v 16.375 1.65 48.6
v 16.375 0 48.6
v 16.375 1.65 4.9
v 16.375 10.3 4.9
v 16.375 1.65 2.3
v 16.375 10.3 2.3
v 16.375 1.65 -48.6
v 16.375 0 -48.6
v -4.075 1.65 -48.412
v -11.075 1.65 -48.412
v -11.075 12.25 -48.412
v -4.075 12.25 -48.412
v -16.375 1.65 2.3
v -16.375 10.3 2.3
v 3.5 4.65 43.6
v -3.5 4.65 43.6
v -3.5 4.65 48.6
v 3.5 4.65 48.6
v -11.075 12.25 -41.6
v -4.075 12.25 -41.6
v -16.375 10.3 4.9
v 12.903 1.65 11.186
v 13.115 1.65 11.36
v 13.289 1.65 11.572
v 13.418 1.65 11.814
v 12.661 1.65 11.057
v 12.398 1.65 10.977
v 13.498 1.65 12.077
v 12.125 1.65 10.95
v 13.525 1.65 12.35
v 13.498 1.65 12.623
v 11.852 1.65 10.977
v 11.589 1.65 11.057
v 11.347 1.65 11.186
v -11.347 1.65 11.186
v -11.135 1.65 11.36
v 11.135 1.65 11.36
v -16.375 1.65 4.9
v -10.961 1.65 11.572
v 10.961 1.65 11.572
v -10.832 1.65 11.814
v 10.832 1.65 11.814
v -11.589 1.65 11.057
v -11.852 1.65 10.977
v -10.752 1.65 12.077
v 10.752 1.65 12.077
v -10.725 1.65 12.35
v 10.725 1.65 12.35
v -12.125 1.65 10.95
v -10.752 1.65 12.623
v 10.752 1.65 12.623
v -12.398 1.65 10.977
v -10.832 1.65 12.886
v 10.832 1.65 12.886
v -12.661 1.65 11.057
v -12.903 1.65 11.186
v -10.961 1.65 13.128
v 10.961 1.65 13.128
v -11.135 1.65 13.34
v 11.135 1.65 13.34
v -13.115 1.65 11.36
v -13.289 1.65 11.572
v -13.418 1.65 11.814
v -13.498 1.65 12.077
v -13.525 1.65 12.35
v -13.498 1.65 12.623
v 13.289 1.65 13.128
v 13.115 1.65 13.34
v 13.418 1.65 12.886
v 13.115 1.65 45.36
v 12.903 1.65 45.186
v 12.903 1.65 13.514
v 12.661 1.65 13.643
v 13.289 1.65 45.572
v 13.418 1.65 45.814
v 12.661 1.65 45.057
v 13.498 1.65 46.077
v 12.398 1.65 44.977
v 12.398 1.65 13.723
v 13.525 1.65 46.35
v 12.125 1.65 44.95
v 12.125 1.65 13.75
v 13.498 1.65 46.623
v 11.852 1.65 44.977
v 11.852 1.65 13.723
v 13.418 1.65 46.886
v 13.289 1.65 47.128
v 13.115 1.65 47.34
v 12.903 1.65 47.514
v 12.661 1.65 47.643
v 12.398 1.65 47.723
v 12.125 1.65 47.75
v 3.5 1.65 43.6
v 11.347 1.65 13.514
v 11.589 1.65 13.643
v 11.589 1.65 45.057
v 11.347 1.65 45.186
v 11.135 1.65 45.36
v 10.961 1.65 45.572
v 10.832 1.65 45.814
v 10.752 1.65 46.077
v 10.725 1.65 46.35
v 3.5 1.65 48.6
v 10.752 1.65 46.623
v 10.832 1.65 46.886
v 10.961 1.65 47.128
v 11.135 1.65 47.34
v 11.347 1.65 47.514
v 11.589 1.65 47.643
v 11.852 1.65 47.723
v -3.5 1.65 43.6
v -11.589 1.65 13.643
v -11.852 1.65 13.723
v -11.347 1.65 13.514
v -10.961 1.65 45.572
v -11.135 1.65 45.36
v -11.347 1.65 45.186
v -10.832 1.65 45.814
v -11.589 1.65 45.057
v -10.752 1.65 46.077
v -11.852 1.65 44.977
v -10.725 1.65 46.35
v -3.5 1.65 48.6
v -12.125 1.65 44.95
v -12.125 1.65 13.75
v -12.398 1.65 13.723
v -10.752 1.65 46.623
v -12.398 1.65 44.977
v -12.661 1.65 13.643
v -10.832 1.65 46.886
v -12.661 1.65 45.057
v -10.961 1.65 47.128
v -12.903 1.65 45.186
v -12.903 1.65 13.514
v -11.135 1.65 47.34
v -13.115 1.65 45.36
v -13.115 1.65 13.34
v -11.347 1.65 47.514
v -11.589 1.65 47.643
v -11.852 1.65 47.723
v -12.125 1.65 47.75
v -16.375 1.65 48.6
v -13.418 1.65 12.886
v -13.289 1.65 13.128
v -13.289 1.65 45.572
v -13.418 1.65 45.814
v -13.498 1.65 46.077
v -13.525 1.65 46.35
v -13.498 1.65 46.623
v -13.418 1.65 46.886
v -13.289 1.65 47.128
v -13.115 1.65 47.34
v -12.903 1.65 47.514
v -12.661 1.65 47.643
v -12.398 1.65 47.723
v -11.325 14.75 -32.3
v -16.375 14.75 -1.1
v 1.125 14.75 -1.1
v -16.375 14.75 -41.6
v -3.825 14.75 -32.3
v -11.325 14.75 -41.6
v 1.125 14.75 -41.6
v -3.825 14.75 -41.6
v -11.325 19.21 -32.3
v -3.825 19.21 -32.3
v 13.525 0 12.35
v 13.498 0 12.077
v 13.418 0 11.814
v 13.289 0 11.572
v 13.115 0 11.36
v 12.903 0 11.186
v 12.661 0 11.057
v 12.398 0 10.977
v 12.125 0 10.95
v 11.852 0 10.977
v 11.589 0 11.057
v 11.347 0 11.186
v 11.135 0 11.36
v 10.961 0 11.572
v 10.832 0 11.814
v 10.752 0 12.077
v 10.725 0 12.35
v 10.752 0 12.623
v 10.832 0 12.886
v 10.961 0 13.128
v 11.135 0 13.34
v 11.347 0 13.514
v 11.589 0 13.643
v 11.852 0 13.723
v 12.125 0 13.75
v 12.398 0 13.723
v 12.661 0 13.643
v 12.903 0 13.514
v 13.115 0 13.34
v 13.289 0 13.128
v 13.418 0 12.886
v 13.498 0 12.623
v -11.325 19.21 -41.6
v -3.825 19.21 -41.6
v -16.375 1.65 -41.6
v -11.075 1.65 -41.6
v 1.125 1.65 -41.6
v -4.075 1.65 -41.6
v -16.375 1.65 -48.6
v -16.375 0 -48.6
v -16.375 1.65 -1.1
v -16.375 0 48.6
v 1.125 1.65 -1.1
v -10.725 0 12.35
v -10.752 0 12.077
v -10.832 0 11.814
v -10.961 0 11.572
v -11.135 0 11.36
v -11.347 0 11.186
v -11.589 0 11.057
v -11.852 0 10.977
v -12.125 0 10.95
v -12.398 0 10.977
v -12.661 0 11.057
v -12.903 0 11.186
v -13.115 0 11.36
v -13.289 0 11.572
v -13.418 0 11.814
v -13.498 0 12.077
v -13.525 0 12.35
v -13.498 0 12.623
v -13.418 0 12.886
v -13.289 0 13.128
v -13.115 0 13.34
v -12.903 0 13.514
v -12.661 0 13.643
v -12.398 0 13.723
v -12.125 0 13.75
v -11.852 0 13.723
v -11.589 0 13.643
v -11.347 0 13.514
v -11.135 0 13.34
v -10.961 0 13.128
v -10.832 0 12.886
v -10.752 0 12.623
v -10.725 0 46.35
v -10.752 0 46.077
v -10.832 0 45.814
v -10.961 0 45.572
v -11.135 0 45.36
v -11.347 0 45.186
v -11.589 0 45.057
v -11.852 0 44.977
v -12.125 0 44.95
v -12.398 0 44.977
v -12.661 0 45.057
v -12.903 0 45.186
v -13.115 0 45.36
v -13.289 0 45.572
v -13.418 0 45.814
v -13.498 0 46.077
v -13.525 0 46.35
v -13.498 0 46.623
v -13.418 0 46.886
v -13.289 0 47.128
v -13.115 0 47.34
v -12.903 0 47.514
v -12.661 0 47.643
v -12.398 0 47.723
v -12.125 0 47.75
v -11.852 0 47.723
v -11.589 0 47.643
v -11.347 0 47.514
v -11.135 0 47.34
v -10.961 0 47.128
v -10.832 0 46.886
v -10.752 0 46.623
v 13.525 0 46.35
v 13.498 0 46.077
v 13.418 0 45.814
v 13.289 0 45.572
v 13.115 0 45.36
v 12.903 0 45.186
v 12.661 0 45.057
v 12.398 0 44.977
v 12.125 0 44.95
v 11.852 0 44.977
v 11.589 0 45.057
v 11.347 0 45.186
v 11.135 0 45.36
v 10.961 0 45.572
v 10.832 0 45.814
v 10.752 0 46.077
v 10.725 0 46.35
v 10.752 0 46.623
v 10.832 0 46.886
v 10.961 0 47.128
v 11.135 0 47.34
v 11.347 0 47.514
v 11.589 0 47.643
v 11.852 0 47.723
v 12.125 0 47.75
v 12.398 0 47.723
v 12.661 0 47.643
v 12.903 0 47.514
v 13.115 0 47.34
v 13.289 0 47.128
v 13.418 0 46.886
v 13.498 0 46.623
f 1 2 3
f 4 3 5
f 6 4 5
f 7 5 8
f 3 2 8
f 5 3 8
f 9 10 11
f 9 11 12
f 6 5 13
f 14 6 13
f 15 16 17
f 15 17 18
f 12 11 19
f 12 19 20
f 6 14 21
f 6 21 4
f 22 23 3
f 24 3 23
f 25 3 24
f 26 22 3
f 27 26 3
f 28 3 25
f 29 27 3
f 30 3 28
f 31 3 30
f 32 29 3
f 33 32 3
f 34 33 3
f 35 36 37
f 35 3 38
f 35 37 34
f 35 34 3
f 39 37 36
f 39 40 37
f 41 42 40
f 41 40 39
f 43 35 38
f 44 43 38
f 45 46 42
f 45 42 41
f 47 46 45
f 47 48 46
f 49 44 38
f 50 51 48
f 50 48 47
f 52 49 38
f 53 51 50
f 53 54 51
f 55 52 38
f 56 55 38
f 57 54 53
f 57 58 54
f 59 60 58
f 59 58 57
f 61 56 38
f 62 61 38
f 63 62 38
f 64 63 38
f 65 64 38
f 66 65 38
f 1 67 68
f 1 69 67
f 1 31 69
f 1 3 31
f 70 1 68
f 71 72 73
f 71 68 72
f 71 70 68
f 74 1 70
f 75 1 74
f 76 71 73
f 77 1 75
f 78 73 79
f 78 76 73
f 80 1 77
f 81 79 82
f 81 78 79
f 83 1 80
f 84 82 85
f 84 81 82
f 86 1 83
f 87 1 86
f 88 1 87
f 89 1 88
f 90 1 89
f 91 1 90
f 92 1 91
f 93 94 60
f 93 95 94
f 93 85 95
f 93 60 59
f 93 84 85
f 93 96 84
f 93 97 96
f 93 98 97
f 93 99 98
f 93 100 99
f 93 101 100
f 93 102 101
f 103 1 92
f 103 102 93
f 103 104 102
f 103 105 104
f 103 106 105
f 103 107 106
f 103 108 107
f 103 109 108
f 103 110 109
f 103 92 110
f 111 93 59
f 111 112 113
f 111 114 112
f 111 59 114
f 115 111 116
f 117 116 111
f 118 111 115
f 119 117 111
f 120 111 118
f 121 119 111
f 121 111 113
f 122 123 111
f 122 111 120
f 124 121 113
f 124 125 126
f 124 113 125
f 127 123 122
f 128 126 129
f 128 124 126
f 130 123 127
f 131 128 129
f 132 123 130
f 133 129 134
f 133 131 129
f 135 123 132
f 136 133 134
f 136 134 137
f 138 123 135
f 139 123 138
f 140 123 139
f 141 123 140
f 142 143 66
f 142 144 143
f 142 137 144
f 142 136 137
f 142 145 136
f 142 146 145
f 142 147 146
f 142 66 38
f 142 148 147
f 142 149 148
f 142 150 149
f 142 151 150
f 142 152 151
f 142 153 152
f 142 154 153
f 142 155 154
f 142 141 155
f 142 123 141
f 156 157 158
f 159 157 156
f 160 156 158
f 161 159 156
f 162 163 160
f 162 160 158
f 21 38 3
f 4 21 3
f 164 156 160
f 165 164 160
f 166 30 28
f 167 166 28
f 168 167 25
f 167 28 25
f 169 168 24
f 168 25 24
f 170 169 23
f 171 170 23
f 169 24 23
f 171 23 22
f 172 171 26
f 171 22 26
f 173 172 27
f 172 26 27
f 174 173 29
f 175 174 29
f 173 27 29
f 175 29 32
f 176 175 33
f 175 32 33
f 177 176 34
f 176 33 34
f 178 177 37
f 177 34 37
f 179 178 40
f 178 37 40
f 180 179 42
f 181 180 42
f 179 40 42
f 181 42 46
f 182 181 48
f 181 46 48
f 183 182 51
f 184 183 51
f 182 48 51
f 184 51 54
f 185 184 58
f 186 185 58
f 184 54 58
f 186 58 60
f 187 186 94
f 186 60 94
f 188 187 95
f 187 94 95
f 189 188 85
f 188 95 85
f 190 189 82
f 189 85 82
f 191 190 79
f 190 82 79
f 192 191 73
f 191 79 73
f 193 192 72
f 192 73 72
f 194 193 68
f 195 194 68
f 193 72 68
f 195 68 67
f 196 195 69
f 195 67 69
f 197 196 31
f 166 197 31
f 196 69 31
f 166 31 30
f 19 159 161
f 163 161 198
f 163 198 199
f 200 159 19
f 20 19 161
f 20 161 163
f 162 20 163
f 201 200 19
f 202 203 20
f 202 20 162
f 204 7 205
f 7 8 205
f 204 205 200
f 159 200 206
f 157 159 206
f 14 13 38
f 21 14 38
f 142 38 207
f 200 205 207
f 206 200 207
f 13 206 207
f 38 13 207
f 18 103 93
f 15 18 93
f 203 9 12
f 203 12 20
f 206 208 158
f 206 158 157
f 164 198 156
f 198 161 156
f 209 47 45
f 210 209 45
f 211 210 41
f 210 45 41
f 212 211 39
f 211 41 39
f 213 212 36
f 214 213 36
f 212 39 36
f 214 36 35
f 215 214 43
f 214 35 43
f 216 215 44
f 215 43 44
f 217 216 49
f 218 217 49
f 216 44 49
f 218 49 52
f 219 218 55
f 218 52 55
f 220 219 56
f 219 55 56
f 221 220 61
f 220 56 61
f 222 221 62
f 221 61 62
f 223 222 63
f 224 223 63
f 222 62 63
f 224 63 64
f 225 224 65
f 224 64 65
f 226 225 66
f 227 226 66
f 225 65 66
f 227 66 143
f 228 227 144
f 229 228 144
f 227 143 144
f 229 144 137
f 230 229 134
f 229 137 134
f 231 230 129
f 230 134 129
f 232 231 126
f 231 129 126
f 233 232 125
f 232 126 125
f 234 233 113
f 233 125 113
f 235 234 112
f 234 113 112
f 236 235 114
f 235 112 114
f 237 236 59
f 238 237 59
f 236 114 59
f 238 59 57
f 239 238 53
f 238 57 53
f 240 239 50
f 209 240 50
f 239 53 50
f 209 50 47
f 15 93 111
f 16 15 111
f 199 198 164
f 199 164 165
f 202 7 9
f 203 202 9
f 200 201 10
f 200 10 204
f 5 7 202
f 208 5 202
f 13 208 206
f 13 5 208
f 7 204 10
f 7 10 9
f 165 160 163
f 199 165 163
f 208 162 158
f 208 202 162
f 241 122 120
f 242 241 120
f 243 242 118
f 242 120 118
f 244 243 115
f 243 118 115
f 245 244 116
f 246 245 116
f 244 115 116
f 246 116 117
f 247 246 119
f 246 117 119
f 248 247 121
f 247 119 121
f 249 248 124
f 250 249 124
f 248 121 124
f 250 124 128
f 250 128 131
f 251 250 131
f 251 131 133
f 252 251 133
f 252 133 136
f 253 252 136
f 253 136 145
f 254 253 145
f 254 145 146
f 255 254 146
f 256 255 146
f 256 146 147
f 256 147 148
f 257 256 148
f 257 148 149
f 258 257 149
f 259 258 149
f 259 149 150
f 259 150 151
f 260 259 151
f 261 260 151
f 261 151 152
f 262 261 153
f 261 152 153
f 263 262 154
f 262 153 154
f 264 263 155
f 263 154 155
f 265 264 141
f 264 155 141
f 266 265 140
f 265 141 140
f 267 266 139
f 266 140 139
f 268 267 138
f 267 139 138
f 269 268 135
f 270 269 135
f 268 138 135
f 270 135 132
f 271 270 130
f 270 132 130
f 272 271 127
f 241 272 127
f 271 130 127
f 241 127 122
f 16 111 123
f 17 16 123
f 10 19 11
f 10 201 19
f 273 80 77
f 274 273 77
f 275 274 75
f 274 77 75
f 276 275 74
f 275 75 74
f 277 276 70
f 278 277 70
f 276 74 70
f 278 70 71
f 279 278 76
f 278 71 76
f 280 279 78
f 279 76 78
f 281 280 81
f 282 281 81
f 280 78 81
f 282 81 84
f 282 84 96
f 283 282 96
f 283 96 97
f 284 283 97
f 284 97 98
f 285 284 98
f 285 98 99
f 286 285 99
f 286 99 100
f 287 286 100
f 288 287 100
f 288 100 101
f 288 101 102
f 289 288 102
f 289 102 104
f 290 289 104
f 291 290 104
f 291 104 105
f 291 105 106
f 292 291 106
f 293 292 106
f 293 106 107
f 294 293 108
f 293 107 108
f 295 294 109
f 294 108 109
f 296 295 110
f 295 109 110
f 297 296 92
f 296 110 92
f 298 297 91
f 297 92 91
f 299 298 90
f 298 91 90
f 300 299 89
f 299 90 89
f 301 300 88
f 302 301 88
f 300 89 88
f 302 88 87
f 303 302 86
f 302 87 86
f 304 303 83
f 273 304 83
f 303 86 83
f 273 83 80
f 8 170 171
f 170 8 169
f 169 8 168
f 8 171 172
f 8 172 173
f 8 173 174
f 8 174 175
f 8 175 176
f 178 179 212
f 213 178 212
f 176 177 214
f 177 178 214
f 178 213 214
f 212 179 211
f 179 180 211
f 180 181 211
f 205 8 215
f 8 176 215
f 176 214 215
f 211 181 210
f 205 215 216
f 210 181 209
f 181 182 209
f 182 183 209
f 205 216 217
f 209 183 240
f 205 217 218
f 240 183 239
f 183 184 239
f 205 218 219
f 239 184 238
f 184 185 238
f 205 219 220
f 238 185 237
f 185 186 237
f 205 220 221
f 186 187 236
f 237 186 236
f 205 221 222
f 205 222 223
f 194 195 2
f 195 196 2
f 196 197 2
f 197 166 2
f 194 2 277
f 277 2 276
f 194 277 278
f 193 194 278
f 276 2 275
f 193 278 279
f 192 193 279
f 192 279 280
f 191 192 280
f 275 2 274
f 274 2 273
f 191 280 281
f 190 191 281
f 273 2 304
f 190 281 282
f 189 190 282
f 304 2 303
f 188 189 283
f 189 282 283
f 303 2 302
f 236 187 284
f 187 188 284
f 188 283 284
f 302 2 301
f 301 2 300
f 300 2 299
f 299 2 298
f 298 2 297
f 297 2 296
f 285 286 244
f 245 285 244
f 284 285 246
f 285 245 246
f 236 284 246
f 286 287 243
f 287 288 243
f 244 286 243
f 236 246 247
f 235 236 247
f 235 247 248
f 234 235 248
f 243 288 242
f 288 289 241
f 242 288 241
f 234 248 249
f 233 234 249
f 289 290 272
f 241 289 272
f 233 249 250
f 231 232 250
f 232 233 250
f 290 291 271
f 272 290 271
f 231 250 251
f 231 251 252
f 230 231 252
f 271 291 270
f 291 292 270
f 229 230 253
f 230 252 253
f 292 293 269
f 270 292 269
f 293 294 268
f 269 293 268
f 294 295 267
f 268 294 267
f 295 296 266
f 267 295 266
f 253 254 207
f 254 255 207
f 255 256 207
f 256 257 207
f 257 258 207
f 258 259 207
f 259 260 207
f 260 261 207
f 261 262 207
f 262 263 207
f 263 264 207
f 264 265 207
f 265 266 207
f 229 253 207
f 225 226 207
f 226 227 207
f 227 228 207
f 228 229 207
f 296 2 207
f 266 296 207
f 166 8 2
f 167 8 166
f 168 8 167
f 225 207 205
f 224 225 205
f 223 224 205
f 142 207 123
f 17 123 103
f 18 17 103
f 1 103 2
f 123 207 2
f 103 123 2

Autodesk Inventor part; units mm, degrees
ref_plane "YZ Plane" through (0, 0, 0) normal (1, 0, 0) x (0, 1, 0)
ref_plane "XZ Plane" through (0, 0, 0) normal (0, 1, 0) x (-1, 0, 0)
ref_plane "XY Plane" through (0, 0, 0) normal (0, 0, 1) x (1, 0, 0)
sketch "Sketch1" plane through (0, 0, 0) normal (0, 1, 0) x (-1, 0, 0)
  line L0 (16.375, 48.6) -> (-16.375, 48.6)
  line L1 (-16.375, 48.6) -> (-16.375, -48.6)
  line L2 (-16.375, -48.6) -> (16.375, -48.6)
  line L3 (16.375, -48.6) -> (16.375, 48.6)
  line L4 (16.375, 48.6) -> (-16.375, -48.6) construction
  line L5 (-16.375, 48.6) -> (16.375, -48.6) construction
  point P0 (0, 0)
  dimension "d0" = 32.75
  dimension "d1" = 97.2
extrude "Extrusion1" add sketch "Sketch1" along normal blind 1.65
sketch "Sketch3" plane through (0, 1.65, 0) normal (0, 1, 0) x (1, 0, 0)
  line L0 (-16.375, 48.6) -> (-16.375, -48.6) projected
  line L1 (-16.375, 41.6) -> (1.125, 41.6)
  line L2 (1.125, 41.6) -> (1.125, 1.1)
  line L3 (1.125, 1.1) -> (-16.375, 1.1)
  line L4 (-16.375, 1.1) -> (-16.375, 41.6)
  line L5 (16.375, 48.6) -> (-16.375, 48.6) projected
  point P0 (0, 0)
  dimension "d7" = 17.5
  dimension "d8" = 40.5
  dimension "d9" = 7
extrude "Extrusion3" add sketch "Sketch3" along normal blind 13.1
sketch "Sketch4" plane through (0, 1.65, 0) normal (0, 1, 0) x (1, 0, 0)
  line L0 (-16.375, 41.6) -> (1.125, 41.6) projected
  line L1 (-4.075, 41.6) -> (-11.075, 41.6)
  line L2 (-11.075, 41.6) -> (-11.075, 48.4118)
  line L3 (-11.075, 48.4118) -> (-4.075, 48.4118)
  line L4 (-4.075, 48.4118) -> (-4.075, 41.6)
  line L5 (-16.375, 48.6) -> (-16.375, 41.6) projected
  point P0 (0, 0)
  dimension "d12" = 7
  dimension "d13" = 5.3
extrude "Extrusion4" add sketch "Sketch4" along normal blind 10.6
sketch "Sketch5" plane through (0, 14.75, 0) normal (0, 1, 0) x (1, 0, 0)
  line L0 (1.125, 41.6) -> (-16.375, 41.6) projected
  line L1 (-16.375, 41.6) -> (-16.375, 1.1) projected
  line L2 (-16.375, 1.1) -> (1.125, 1.1) projected
  line L3 (1.125, 1.1) -> (1.125, 41.6) projected
  line L4 (-11.075, 48.4118) -> (-11.075, 41.6) projected
  line L5 (-4.075, 41.6) -> (-11.075, 41.6) projected
  line L6 (-4.075, 41.6) -> (-4.075, 48.4118) projected
  line L7 (-4.075, 48.4118) -> (-11.075, 48.4118) projected
  line L8 (-4.075, 41.6) -> (-11.075, 41.6) projected
  line L9 (-3.825, 41.6) -> (-11.325, 41.6)
  line L10 (-11.325, 41.6) -> (-11.325, 32.3)
  line L11 (-11.325, 32.3) -> (-3.825, 32.3)
  line L12 (-3.825, 32.3) -> (-3.825, 41.6)
  point P0 (0, 0)
  point P1 (-7.575, 41.6)
  dimension "d16" = 9.3
  dimension "d17" = 7.5
extrude "Extrusion5" add sketch "Sketch5" along normal blind 4.46 contours L12 L11 L10 L0
sketch "Sketch6" plane through (-4.075, 1.65, -48.4118) normal (0, 0, -1) x (-1, 0, 0)
  point P0 (-4.075, -1.65)
sketch "Sketch7" plane through (0, 1.65, 0) normal (0, 1, 0) x (1, 0, 0)
  line L0 (-11.325, 32.3) -> (-11.325, 41.6) projected
  line L1 (-11.325, 41.6) -> (-16.375, 41.6) projected
  line L2 (-16.375, 41.6) -> (-16.375, 1.1) projected
  line L3 (-16.375, 1.1) -> (1.125, 1.1) projected
  line L4 (1.125, 1.1) -> (1.125, 41.6) projected
  line L5 (1.125, 41.6) -> (-3.825, 41.6) projected
  line L6 (-3.825, 41.6) -> (-3.825, 32.3) projected
  line L7 (-3.825, 32.3) -> (-11.325, 32.3) projected
  line L8 (16.375, -48.6) -> (16.375, 48.6) projected
  line L9 (-16.375, 48.6) -> (-16.375, -48.6) projected
  line L10 (16.375, -2.3) -> (-16.375, -2.3)
  line L11 (-16.375, -2.3) -> (-16.375, -4.9)
  line L12 (-16.375, -4.9) -> (16.375, -4.9)
  line L13 (16.375, -4.9) -> (16.375, -2.3)
  point P0 (0, 0)
  point P1 (-16.375, -2.3)
  dimension "d20" = 2.6
  dimension "d21" = 3.4
extrude "Extrusion6" add sketch "Sketch7" along normal blind 8.65 contours L10 L8 L12 L9
sketch "Sketch8" plane through (0, 1.65, 0) normal (0, 1, 0) x (1, 0, 0)
  circle A0 centre (-12.125, -46.35) radius 1.4
  line L0 (-16.375, -4.9) -> (-16.375, -48.6) projected
  line L1 (-16.375, -48.6) -> (16.375, -48.6) projected
  circle A1 centre (-12.125, -12.35) radius 1.4
  line L2 (0, -48.6) -> (0, 0) construction
  circle A2 centre (12.125, -46.35) radius 1.4
  circle A3 centre (12.125, -12.35) radius 1.4
  dimension "d24" = 2.8
  dimension "d25" = 4.25
  dimension "d26" = 2.25
  dimension "d27" = 34
extrude "Extrusion7" cut sketch "Sketch8" against normal up to surface (1.65 mm away)
sketch "Sketch9" plane through (0, 1.65, 0) normal (0, 1, 0) x (1, 0, 0)
  line L0 (-16.375, -48.6) -> (16.375, -48.6) projected
  line L1 (3.5, -43.6) -> (-3.5, -43.6)
  line L2 (-3.5, -43.6) -> (-3.5, -48.6)
  line L3 (-3.5, -48.6) -> (3.5, -48.6)
  line L4 (3.5, -48.6) -> (3.5, -43.6)
  line L5 (3.5, -43.6) -> (-3.5, -48.6) construction
  line L6 (-3.5, -43.6) -> (3.5, -48.6) construction
  point P0 (0, 0)
  point P1 (0, -46.1)
  point P2 (0, -48.6)
  dimension "d30" = 5
  dimension "d31" = 7
extrude "Extrusion8" add sketch "Sketch9" along normal blind 3
properties part number "PCB Board"
